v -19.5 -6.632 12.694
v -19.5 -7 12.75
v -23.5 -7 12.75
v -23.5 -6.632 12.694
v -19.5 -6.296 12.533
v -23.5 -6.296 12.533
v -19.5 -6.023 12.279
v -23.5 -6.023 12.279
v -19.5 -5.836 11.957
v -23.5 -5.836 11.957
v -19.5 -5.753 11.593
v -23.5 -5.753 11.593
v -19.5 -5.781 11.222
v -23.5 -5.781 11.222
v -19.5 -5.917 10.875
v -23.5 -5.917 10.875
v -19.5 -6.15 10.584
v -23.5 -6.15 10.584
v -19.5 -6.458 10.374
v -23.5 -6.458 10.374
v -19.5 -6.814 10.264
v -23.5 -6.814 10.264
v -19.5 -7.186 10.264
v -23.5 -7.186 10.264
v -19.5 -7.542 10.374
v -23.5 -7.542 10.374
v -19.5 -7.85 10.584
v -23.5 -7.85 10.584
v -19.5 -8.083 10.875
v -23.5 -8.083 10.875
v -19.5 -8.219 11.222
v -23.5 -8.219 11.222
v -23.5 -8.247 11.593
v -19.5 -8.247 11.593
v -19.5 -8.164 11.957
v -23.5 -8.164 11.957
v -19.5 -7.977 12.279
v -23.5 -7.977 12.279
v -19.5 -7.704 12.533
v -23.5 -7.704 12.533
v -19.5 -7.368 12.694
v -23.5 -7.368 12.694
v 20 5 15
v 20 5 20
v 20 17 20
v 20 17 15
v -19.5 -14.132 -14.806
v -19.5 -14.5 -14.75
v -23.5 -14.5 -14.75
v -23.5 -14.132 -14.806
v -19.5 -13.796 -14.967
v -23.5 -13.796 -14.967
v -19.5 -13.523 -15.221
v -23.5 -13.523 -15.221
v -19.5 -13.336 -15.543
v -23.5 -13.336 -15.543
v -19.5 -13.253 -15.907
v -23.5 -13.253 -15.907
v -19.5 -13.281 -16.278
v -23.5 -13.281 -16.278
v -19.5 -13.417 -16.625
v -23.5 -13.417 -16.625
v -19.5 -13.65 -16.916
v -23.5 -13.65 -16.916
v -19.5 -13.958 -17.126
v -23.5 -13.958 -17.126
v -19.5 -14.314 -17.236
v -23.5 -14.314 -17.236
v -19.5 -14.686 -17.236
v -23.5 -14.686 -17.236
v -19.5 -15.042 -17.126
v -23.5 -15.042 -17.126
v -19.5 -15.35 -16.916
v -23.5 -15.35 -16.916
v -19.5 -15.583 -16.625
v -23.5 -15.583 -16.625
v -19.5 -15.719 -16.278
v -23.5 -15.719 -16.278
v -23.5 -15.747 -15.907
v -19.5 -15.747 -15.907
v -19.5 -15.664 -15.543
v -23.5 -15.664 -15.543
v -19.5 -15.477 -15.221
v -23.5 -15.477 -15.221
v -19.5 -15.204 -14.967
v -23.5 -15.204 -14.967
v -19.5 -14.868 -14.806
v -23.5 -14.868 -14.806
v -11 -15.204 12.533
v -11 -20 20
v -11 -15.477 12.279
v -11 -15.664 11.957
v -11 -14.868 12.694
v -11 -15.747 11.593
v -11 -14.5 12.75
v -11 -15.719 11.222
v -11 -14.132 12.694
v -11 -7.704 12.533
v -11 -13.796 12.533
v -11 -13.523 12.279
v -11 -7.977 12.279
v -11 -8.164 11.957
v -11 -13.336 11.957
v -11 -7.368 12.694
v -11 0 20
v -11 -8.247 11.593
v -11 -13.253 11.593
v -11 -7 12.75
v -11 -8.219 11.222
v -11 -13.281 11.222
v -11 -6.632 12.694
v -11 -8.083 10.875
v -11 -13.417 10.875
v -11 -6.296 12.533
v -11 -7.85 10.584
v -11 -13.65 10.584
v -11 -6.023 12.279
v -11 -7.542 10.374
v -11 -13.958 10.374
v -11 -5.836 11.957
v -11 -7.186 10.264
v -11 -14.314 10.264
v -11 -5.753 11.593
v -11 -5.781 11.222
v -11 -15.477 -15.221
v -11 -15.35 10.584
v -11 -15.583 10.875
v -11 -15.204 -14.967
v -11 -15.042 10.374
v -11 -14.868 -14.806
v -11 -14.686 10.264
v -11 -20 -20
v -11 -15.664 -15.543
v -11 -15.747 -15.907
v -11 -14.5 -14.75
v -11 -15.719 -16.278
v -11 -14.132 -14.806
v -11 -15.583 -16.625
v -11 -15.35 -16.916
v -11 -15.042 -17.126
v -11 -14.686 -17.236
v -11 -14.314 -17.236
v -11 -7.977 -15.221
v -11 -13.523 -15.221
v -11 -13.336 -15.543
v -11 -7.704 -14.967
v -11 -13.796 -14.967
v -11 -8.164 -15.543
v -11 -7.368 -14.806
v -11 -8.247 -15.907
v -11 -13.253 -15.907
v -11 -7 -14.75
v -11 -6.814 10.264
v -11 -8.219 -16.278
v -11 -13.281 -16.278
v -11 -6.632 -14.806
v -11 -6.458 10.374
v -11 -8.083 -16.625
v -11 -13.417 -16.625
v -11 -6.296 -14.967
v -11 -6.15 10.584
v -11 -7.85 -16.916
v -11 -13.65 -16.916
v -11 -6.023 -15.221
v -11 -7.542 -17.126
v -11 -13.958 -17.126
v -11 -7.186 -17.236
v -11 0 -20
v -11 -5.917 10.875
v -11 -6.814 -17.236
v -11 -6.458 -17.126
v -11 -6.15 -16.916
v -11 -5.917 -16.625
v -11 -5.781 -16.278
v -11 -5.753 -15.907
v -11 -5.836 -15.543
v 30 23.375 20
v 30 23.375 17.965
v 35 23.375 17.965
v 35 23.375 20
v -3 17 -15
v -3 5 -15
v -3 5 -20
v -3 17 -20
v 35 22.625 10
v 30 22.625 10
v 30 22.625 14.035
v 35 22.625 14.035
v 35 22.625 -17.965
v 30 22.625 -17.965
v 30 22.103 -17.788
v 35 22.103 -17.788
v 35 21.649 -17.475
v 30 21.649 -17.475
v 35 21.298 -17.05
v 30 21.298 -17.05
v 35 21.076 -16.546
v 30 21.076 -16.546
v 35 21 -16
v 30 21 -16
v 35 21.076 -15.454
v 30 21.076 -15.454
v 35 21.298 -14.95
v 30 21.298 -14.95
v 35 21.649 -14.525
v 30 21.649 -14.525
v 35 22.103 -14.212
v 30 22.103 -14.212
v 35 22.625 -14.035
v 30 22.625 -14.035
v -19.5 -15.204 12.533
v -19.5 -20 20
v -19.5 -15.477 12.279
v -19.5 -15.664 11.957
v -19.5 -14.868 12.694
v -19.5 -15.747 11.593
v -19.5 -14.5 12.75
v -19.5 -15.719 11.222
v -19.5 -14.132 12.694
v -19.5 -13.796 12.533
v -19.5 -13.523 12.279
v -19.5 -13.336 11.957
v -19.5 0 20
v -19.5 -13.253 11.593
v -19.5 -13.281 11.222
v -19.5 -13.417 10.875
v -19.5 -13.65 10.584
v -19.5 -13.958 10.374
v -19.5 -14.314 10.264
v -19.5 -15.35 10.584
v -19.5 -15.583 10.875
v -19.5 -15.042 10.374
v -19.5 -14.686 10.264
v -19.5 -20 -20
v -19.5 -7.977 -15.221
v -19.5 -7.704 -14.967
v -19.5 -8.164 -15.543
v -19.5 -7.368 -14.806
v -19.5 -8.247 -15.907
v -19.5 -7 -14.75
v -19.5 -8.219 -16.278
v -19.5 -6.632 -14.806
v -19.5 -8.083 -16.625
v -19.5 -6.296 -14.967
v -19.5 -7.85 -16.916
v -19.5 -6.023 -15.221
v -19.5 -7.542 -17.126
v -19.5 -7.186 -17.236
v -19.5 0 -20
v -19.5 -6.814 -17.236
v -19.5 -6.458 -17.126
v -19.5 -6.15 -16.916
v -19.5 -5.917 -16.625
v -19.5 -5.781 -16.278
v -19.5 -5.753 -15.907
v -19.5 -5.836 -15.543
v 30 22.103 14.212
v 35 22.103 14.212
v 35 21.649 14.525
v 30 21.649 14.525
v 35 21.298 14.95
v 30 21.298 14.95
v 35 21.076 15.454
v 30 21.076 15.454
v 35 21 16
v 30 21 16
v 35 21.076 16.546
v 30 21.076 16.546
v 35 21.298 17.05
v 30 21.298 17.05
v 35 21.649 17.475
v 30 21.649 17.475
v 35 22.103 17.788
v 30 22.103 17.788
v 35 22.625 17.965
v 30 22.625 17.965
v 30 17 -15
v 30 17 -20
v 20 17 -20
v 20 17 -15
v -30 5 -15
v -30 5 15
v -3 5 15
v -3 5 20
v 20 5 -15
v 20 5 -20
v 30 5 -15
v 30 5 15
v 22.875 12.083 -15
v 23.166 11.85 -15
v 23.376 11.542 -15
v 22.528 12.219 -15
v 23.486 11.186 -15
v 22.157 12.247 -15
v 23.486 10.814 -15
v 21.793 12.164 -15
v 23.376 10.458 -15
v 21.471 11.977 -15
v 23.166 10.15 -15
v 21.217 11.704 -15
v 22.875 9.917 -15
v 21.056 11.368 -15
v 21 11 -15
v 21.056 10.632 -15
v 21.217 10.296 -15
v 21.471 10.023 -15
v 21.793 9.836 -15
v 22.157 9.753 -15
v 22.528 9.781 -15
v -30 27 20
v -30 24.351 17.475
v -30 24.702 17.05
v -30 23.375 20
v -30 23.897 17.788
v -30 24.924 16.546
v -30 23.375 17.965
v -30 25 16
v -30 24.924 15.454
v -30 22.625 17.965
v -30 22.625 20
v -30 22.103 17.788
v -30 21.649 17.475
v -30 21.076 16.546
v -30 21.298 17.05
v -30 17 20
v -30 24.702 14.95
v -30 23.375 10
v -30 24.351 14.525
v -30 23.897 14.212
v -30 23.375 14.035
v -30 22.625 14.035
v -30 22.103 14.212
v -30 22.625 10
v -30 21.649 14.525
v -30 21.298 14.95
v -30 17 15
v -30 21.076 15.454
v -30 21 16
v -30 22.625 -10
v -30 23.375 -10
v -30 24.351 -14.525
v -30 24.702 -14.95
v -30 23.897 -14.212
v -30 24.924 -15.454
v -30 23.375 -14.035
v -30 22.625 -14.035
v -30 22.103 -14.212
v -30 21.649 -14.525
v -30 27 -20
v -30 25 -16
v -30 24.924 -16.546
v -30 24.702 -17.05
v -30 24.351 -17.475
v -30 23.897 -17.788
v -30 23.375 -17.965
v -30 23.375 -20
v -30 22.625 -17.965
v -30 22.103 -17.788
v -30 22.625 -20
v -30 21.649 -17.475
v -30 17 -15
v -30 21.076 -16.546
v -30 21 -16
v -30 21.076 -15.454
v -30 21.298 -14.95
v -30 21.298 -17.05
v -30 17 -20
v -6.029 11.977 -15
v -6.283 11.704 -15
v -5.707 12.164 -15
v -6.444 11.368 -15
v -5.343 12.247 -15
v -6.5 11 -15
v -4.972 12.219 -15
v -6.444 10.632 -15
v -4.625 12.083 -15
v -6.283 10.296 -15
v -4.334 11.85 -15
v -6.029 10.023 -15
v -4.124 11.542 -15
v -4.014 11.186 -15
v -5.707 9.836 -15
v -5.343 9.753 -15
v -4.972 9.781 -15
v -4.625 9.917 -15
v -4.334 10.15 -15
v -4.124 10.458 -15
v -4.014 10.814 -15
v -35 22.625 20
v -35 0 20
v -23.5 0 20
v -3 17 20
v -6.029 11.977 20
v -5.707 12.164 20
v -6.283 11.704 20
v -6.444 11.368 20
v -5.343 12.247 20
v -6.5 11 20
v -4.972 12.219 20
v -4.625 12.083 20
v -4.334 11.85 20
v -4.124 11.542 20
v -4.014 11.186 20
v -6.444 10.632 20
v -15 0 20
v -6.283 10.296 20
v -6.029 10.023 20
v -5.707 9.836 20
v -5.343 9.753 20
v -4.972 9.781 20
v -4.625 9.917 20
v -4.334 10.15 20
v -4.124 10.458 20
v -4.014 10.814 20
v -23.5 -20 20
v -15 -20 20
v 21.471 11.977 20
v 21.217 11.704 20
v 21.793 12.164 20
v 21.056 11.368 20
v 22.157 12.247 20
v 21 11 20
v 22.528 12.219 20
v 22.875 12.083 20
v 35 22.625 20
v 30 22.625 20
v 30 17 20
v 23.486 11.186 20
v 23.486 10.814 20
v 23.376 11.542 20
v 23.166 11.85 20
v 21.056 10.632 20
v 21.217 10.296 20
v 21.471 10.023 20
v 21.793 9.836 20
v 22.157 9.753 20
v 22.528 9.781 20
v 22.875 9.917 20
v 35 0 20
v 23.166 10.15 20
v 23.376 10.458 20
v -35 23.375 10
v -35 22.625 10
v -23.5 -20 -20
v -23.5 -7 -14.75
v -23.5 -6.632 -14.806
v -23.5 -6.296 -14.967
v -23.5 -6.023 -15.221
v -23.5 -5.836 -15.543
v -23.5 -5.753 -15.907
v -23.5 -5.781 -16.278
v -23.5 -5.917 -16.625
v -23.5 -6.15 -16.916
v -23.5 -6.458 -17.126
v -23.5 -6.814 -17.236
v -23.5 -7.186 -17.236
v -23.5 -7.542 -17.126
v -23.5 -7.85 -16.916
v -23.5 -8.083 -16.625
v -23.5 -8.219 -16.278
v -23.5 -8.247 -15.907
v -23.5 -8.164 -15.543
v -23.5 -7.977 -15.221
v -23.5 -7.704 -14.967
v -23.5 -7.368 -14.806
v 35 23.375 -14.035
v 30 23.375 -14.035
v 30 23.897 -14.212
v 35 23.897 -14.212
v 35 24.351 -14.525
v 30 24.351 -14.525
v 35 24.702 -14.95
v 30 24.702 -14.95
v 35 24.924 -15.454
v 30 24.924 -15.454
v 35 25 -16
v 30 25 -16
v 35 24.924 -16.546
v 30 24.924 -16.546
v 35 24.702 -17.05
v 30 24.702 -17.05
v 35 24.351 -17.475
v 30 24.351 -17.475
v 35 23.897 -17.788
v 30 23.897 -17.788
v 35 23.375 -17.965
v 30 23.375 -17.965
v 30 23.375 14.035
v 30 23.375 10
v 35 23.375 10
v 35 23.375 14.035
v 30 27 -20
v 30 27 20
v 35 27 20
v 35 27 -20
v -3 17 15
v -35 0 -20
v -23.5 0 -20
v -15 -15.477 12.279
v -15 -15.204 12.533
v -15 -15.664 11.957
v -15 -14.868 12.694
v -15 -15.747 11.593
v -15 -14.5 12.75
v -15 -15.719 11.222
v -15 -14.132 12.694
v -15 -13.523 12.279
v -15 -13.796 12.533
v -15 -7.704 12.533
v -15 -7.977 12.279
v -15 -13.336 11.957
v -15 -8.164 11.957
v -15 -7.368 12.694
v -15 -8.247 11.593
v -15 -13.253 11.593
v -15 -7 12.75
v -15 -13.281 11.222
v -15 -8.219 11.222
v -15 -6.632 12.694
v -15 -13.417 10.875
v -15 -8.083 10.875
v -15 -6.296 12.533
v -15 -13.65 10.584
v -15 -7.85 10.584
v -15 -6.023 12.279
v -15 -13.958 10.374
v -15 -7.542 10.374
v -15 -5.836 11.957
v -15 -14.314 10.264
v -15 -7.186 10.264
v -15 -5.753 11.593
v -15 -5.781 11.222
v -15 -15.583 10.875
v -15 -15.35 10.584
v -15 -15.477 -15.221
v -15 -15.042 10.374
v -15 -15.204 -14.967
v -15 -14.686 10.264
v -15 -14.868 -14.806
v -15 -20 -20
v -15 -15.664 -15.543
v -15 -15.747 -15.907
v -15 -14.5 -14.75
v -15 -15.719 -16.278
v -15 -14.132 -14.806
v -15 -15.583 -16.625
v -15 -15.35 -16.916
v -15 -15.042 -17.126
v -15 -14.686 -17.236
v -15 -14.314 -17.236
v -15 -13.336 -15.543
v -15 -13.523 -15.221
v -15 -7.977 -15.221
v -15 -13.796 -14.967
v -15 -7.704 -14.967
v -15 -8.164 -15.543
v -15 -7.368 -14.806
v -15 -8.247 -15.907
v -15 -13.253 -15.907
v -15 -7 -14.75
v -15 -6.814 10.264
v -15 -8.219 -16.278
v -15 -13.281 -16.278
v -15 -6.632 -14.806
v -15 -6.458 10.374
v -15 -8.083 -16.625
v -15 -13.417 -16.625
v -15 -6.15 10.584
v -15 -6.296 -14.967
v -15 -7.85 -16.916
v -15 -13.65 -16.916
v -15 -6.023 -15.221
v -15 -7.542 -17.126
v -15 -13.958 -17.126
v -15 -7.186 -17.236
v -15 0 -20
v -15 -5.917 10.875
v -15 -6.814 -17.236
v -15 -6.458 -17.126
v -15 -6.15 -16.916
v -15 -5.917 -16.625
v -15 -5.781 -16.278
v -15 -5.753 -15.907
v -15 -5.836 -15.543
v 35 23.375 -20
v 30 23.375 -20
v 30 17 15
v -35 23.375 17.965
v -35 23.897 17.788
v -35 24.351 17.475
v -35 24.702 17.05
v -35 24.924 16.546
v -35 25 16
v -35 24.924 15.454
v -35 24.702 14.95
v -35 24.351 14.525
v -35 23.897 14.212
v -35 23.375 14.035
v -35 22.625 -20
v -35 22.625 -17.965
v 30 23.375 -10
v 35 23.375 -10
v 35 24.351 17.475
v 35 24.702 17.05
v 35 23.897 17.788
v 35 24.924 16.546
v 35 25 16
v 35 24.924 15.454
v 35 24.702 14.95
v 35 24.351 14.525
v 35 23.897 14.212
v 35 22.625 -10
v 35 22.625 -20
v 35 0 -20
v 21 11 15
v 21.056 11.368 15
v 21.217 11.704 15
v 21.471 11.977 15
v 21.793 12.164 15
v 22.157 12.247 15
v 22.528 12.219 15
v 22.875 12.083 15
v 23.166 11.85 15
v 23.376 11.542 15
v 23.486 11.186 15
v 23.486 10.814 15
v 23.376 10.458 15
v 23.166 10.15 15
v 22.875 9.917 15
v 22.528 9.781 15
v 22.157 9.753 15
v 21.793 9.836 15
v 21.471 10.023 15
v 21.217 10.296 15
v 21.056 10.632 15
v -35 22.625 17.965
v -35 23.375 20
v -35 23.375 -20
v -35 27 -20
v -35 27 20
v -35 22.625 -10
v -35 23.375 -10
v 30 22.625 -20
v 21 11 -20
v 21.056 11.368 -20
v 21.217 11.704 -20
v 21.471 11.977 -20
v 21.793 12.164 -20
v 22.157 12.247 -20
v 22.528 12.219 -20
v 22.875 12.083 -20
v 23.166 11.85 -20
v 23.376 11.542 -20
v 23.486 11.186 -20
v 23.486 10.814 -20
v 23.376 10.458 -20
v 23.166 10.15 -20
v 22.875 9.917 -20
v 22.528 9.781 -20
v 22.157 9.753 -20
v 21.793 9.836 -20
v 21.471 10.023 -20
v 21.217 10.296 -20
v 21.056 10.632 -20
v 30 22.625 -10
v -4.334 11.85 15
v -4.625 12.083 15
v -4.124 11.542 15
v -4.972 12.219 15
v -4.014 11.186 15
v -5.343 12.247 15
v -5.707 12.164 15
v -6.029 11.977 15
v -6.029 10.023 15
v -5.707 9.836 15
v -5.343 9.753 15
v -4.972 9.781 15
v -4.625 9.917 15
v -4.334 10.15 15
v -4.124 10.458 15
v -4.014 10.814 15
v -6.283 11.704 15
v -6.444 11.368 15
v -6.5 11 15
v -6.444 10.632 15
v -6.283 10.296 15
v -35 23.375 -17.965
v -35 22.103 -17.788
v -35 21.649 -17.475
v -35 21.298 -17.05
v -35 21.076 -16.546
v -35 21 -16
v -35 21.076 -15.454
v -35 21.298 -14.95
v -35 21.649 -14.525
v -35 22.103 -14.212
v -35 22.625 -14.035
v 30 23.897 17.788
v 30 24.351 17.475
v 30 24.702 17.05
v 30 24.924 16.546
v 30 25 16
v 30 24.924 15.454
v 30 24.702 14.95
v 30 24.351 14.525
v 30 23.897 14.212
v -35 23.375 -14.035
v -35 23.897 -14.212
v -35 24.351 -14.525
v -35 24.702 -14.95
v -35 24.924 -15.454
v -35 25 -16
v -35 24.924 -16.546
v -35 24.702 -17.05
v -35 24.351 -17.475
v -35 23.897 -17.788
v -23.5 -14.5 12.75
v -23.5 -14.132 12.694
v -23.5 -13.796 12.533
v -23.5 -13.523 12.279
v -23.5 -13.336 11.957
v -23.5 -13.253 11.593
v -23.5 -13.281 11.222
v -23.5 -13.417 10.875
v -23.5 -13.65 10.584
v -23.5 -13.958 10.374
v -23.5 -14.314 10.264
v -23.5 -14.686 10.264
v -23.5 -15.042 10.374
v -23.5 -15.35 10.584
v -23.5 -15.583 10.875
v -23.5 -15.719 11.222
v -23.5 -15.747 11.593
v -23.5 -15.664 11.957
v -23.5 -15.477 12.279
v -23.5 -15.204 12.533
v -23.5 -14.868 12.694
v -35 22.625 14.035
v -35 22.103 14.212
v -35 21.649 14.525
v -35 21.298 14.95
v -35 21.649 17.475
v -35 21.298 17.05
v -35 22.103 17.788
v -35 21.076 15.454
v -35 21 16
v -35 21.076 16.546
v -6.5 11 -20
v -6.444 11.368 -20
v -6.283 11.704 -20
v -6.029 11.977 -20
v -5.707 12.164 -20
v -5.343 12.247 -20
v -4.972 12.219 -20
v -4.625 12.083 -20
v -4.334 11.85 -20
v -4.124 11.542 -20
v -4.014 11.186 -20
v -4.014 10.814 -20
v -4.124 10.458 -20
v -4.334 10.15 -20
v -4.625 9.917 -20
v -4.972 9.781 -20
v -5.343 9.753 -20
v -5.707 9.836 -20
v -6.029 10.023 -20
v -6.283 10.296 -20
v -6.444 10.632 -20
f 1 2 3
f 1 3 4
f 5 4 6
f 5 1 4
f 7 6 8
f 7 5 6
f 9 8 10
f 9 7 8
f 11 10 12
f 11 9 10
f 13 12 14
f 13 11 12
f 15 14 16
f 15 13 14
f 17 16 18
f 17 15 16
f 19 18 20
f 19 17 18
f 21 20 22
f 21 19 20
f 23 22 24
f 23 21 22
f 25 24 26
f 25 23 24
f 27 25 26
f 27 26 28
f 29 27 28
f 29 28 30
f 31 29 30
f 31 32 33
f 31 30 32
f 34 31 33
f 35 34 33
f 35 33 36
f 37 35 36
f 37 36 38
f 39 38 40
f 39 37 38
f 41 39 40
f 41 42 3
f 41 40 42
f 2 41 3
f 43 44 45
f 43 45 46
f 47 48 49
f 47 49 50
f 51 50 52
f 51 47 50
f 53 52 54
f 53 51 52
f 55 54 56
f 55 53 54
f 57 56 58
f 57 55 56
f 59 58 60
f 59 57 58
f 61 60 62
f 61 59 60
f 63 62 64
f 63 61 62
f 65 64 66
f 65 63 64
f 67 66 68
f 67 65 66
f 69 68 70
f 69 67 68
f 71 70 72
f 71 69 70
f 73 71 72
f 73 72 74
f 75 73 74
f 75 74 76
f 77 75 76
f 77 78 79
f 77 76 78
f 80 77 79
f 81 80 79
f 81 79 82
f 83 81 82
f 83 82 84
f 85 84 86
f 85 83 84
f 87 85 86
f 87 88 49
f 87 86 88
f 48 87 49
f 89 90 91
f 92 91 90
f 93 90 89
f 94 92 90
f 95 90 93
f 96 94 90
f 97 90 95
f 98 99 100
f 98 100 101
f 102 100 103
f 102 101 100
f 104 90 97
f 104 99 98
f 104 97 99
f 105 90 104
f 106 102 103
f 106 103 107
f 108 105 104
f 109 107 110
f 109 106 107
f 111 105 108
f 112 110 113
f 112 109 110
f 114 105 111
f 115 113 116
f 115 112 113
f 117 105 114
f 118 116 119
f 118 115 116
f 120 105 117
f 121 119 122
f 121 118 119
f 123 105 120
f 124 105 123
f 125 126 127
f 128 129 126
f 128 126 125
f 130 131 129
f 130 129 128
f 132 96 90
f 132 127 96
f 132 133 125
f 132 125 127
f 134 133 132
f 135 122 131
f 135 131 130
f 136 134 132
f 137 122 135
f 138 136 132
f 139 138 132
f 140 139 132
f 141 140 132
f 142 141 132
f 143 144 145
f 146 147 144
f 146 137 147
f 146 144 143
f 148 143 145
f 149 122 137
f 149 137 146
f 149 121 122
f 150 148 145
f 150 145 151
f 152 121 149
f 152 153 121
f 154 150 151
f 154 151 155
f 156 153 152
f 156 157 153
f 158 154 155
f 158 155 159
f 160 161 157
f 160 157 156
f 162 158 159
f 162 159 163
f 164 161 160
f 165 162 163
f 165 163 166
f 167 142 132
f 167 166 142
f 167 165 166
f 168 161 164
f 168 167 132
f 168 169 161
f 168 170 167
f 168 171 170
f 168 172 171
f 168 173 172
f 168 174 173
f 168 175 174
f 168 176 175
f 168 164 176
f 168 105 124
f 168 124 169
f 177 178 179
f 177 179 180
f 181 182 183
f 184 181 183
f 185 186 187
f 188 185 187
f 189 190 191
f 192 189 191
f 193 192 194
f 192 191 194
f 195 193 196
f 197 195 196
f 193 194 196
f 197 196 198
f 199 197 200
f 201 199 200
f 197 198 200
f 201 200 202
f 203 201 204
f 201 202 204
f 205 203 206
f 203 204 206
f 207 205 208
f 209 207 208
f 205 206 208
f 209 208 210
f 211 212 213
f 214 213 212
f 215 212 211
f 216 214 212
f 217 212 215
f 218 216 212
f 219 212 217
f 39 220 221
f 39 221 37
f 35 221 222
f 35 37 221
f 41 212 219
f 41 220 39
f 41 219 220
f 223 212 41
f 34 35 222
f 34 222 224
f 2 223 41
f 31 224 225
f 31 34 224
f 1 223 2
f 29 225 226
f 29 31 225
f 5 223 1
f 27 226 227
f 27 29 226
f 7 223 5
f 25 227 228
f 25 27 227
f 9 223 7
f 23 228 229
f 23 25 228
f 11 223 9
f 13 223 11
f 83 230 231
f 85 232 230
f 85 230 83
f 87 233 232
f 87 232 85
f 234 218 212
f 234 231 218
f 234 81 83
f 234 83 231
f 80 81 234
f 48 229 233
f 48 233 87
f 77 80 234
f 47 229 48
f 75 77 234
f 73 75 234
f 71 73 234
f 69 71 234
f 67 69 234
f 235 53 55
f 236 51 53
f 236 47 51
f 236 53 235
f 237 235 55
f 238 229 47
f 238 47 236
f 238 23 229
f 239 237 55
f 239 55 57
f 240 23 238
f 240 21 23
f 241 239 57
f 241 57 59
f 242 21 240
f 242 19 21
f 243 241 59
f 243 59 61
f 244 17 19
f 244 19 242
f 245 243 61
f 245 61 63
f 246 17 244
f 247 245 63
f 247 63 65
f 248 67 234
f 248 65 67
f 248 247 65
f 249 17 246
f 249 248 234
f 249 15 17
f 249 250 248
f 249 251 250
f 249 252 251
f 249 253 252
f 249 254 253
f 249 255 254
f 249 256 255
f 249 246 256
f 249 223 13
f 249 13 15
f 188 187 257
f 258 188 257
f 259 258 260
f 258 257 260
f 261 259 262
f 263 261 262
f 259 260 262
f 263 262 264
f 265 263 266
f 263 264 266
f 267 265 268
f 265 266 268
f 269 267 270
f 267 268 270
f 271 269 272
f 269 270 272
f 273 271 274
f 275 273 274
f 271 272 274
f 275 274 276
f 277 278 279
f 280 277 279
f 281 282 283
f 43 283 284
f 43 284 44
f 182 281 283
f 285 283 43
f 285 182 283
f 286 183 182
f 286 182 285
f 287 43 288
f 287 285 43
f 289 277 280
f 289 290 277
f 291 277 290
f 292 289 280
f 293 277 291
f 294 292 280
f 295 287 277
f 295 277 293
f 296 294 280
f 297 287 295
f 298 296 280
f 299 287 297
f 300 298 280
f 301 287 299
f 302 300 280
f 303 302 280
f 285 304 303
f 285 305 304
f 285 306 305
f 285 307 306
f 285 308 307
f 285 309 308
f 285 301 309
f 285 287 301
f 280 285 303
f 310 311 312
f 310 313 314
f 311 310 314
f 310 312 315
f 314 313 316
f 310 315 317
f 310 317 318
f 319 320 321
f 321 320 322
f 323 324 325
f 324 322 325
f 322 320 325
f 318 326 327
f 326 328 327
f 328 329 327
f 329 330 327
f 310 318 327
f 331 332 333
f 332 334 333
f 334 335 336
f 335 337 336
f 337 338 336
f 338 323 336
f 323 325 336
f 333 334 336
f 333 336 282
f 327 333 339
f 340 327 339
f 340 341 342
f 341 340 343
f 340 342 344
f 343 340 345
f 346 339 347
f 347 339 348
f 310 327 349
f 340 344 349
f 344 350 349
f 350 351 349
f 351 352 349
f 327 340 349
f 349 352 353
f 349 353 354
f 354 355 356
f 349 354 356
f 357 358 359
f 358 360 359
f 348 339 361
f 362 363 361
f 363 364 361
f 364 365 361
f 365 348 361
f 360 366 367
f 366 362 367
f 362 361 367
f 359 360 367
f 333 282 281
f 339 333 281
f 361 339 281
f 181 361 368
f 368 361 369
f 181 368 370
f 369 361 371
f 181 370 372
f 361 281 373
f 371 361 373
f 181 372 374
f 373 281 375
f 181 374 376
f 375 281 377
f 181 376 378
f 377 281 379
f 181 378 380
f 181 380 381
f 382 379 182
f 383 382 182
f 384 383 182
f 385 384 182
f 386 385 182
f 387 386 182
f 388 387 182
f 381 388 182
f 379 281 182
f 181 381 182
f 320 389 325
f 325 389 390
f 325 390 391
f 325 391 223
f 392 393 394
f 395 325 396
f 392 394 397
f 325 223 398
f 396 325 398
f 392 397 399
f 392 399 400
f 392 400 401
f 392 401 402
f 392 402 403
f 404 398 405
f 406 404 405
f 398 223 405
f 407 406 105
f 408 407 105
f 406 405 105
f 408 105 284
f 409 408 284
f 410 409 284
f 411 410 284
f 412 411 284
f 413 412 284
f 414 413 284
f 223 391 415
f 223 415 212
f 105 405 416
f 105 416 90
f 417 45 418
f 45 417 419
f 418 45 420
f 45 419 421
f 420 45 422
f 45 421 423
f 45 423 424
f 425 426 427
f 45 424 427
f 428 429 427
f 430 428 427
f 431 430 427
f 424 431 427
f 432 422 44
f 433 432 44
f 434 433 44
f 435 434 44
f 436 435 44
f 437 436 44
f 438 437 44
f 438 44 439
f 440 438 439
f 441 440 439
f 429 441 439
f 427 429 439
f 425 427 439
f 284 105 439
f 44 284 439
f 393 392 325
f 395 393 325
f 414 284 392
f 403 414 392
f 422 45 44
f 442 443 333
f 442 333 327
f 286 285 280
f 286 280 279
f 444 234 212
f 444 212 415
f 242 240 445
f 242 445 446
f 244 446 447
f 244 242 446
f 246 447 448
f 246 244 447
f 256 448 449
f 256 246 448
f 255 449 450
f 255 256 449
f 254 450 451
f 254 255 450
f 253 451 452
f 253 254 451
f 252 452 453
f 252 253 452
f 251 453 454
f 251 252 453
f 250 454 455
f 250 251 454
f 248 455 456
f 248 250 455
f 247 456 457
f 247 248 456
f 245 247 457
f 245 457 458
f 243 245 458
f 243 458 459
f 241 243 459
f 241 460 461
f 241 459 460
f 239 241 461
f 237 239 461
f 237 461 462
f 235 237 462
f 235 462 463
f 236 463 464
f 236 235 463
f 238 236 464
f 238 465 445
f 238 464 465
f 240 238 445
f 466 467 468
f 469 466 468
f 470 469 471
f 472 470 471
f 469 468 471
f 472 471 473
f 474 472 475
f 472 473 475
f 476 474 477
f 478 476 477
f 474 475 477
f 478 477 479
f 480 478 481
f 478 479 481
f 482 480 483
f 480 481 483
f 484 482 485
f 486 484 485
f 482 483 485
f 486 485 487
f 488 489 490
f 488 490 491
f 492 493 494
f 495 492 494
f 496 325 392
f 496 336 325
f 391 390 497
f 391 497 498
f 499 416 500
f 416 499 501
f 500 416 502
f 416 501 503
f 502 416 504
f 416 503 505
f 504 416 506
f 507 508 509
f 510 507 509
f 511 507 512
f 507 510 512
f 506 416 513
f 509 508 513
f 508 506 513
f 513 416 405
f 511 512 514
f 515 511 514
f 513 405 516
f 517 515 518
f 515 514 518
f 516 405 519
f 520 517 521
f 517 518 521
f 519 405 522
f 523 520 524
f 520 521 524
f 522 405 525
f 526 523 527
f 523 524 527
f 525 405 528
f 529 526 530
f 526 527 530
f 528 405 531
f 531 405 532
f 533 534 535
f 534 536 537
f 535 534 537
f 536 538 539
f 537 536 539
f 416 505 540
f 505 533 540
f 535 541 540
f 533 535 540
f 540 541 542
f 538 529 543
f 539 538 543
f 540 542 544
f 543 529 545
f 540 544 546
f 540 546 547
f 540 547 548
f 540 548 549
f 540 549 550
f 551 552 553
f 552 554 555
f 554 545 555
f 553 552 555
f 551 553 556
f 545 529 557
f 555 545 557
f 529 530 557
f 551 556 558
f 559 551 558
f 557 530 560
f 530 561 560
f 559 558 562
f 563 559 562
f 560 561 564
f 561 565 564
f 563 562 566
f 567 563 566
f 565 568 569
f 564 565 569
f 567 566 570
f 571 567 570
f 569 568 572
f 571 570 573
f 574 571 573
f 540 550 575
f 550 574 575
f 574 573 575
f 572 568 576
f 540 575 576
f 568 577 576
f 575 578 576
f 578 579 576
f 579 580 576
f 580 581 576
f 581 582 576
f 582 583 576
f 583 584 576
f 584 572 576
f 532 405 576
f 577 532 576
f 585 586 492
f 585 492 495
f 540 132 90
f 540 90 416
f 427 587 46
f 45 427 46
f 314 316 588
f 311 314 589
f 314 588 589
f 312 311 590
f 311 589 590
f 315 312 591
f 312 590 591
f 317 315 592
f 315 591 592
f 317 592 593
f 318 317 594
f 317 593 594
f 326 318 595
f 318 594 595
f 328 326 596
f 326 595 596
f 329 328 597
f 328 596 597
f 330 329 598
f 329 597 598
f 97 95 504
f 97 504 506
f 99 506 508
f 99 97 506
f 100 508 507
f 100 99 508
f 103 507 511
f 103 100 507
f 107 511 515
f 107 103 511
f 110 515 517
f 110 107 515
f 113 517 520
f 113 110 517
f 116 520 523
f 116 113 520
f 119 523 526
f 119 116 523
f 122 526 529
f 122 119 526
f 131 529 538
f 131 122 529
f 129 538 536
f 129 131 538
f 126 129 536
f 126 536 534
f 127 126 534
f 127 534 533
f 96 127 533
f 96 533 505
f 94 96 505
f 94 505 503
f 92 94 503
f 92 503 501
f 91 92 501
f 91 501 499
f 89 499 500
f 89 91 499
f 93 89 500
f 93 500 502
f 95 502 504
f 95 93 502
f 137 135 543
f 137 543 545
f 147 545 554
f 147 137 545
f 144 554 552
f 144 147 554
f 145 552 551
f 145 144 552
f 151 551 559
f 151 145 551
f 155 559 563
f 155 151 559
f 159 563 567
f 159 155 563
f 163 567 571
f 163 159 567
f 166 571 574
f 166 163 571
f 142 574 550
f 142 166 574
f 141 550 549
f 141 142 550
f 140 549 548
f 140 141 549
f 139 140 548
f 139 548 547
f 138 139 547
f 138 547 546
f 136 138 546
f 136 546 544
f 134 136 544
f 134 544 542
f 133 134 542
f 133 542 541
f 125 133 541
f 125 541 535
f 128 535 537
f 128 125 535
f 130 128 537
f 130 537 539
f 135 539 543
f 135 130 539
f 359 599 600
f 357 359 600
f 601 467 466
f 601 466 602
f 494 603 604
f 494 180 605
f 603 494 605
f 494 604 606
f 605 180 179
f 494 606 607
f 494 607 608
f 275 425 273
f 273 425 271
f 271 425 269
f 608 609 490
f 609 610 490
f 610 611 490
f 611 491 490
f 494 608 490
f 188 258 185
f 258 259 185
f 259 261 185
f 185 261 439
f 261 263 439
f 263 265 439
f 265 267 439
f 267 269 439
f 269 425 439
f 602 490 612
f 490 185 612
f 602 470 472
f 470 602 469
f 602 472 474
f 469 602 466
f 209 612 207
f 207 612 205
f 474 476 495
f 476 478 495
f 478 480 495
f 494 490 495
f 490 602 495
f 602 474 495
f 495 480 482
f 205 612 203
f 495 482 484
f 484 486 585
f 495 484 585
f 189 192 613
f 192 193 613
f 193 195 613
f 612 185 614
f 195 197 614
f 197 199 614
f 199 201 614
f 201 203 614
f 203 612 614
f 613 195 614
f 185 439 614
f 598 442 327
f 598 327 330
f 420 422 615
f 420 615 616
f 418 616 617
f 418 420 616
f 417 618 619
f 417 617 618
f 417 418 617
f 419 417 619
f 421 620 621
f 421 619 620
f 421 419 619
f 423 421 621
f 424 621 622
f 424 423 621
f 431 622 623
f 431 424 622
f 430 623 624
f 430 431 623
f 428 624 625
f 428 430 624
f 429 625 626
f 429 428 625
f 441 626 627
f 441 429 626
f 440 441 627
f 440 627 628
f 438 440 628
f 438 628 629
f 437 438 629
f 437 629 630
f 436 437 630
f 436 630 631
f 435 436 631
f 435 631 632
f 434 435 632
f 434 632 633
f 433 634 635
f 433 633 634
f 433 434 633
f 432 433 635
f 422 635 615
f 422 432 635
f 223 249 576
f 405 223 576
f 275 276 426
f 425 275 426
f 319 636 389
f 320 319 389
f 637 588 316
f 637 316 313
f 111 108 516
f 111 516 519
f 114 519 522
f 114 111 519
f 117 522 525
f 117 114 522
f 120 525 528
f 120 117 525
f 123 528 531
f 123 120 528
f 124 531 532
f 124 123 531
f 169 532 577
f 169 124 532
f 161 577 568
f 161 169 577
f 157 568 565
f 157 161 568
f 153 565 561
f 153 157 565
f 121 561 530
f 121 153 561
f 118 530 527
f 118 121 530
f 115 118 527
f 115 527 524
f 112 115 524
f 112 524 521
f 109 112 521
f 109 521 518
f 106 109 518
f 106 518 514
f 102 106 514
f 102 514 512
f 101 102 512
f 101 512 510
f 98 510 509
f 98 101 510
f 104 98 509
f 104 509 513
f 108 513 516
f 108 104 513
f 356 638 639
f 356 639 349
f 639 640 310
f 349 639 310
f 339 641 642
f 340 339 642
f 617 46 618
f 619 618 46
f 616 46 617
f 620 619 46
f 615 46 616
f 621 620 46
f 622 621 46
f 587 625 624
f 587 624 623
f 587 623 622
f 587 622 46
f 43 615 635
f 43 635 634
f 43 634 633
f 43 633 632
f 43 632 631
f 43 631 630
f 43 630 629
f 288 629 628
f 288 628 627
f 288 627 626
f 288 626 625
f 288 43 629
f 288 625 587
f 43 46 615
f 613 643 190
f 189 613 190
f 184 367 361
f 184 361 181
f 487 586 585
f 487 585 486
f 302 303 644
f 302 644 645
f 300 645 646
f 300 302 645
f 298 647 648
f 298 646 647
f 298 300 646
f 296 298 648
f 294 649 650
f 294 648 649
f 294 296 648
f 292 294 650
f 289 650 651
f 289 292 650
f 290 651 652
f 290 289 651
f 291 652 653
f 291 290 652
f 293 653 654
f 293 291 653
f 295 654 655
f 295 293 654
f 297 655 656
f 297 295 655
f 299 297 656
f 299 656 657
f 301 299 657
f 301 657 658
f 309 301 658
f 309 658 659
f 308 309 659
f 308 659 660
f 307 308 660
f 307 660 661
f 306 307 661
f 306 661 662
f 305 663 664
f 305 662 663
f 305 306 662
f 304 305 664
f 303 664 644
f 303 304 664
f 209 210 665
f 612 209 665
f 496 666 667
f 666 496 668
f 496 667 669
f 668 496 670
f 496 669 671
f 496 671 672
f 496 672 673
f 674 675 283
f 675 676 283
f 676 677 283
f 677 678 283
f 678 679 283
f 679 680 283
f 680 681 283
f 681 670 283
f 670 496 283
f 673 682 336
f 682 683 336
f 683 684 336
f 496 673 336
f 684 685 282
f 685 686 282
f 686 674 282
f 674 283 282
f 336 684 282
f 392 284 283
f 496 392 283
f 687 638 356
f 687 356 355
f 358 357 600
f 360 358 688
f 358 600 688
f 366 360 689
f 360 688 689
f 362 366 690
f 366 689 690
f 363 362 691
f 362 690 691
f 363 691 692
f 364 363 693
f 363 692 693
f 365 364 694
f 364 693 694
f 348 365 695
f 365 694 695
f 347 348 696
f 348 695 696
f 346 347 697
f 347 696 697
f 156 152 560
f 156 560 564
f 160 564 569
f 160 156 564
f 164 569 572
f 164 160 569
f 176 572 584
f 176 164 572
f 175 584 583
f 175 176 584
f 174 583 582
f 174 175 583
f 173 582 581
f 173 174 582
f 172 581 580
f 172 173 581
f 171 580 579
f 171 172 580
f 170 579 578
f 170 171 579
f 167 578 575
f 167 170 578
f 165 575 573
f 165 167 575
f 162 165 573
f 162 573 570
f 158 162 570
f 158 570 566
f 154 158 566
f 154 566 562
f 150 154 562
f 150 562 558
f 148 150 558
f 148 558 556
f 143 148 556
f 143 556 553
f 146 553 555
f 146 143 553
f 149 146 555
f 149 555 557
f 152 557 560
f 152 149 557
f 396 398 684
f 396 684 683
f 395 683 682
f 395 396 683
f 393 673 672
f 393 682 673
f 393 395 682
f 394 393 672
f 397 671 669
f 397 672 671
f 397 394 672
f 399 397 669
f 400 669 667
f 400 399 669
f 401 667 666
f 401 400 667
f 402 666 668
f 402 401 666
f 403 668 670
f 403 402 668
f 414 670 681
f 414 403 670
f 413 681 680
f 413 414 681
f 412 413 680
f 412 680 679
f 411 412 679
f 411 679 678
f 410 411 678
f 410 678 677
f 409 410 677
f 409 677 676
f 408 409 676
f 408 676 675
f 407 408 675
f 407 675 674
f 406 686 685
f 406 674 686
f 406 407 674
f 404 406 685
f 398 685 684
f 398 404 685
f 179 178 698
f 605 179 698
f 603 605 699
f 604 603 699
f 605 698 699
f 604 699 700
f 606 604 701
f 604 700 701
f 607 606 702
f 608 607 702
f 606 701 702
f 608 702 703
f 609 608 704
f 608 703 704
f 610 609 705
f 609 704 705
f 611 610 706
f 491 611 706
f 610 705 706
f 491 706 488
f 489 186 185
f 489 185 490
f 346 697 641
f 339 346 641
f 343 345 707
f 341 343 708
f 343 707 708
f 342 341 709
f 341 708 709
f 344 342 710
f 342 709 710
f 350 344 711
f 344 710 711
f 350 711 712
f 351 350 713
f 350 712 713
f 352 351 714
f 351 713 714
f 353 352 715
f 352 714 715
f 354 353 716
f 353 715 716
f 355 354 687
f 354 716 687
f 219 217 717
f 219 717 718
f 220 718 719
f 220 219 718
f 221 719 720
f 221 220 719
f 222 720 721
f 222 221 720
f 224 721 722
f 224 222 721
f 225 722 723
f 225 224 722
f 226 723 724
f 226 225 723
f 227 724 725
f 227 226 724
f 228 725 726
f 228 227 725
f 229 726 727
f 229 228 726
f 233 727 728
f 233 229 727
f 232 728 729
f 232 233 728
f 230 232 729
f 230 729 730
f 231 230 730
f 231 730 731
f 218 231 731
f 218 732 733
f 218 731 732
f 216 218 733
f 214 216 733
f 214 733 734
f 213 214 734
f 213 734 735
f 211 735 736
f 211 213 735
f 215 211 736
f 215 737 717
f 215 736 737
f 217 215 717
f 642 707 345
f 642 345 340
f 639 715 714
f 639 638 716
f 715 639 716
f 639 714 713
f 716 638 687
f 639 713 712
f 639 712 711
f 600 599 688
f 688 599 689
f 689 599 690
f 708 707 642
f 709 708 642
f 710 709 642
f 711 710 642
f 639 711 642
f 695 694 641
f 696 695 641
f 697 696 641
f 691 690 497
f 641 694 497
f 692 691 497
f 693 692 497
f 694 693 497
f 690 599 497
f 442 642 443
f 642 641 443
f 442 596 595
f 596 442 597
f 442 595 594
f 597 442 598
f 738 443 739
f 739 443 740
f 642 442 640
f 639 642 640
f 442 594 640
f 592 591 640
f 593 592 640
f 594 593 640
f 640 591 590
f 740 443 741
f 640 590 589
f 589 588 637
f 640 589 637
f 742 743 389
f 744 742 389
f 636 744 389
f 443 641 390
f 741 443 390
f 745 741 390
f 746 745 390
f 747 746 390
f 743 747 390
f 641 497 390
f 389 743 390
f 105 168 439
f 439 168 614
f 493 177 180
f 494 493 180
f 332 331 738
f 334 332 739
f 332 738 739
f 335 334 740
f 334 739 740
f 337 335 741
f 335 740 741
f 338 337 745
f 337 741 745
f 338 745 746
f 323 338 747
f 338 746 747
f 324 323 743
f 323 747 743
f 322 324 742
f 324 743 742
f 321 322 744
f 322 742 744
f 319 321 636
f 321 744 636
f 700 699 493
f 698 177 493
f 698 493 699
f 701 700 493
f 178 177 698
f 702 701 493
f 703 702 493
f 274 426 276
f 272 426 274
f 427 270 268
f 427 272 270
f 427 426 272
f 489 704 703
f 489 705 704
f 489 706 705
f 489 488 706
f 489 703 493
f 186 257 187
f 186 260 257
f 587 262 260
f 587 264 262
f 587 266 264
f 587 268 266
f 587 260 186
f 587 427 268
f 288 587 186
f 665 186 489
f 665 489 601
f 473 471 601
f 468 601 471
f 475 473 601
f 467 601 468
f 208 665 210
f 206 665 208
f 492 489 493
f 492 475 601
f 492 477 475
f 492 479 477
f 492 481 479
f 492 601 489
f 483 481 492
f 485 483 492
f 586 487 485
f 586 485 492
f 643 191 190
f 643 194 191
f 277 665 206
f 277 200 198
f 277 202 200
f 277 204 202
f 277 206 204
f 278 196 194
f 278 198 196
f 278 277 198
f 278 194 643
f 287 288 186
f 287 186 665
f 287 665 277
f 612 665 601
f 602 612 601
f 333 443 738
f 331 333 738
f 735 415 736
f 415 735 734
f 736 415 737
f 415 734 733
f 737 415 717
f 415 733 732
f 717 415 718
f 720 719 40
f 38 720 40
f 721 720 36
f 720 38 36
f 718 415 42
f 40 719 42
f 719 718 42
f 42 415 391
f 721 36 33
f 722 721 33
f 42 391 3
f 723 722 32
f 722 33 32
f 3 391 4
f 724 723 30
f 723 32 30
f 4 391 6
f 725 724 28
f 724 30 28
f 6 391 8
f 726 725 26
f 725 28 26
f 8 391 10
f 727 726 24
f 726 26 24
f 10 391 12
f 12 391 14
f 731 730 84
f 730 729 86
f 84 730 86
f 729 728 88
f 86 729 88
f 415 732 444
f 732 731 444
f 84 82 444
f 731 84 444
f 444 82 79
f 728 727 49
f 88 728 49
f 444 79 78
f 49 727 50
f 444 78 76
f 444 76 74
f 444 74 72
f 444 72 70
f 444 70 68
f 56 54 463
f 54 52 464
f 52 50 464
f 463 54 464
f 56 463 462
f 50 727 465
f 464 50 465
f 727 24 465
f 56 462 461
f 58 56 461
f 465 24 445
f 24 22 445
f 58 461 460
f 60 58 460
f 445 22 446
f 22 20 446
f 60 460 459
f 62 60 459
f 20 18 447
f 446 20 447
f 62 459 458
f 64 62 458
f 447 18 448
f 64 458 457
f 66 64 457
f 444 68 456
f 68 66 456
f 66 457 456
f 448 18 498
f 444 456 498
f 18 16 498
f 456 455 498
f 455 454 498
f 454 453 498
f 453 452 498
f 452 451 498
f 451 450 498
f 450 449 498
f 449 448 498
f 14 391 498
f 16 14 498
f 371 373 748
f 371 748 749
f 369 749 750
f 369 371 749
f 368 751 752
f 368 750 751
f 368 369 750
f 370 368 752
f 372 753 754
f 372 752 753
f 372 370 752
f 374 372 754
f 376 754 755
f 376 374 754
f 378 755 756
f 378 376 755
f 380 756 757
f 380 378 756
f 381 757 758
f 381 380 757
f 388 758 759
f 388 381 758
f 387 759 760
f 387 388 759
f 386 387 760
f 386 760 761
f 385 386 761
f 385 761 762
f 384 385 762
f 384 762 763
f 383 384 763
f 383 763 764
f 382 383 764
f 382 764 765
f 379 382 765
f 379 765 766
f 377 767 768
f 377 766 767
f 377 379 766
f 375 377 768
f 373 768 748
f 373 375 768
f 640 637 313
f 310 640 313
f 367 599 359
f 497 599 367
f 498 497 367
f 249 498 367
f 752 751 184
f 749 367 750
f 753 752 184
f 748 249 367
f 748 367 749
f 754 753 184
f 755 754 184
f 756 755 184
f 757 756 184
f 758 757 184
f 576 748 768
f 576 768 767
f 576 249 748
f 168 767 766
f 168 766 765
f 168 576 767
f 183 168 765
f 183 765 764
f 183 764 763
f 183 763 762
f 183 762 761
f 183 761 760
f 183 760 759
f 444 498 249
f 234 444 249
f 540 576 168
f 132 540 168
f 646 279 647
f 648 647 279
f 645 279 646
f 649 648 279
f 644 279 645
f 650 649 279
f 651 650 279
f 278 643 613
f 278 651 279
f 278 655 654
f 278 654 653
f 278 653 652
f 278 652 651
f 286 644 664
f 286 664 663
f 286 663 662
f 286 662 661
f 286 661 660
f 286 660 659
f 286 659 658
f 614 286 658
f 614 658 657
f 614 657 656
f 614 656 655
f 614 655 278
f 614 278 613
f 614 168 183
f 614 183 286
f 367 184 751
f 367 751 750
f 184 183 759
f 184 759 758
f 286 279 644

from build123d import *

# Parameters (mm, degrees)
SKETCH1_W               = 70
SKETCH1_H               = 40
BOSS_EXTRUDE1_DEPTH     = 5
BOSS_EXTRUDE2_DEPTH     = 12
SKETCH3_W               = 5
SKETCH3_H               = 40
BOSS_EXTRUDE3_DEPTH     = 10
SKETCH5_R               = 2
CUT_EXTRUDE1_DEPTH      = 78.646635471
CUT_EXTRUDE3_DEPTH      = 57.382621436
CUT_EXTRUDE3_DEPTH_BACK = 57.382621436
SKETCH7_R               = 1.25
SKETCH8_W               = 10
SKETCH8_H               = 0.75
CUT_EXTRUDE4_DEPTH      = 78.646635471
SKETCH9_W               = 4
SKETCH9_H               = 40
BOSS_EXTRUDE4_DEPTH     = 20
CUT_EXTRUDE5_DEPTH      = 50.727549083
CUT_EXTRUDE5_DEPTH_BACK = 50.727549083
SKETCH11_R              = 1.25


with BuildPart() as part:
    # Sketch1 → Boss-Extrude1 (new body)
    with BuildSketch(Plane(origin=(0, 0, 0), x_dir=(1, 0, 0), z_dir=(0, 1, 0))):
        Rectangle(SKETCH1_W, SKETCH1_H)
    extrude(amount=BOSS_EXTRUDE1_DEPTH)

    # Sketch2 → Boss-Extrude2 (add)
    with BuildSketch(Plane(origin=(0, 5, 0), x_dir=(1, 0, 0), z_dir=(0, 1, 0))):
        Polygon((-3, -20), (-3, -15), (-30, -15), (-30, 15), (-3, 15), (-3, 20), (-35, 20), (-35, -20), align=None)
        Polygon((20, -15), (30, -15), (30, 15), (20, 15), (20, 20), (35, 20), (35, -20), (20, -20), align=None)
    extrude(amount=BOSS_EXTRUDE2_DEPTH)

    # Sketch3 → Boss-Extrude3 (add)
    with BuildSketch(Plane(origin=(0, 17, 0), x_dir=(1, 0, 0), z_dir=(0, 1, 0))):
        with Locations((32.5, 0)):
            Rectangle(SKETCH3_W, SKETCH3_H)
        with Locations((-32.5, 0)):
            Rectangle(SKETCH3_W, SKETCH3_H)
    extrude(amount=BOSS_EXTRUDE3_DEPTH)

    # Sketch5 → Cut-Extrude1 (cut, through all)
    with BuildSketch(Plane.ZY.offset(35)):
        with Locations((16, 23)):
            Circle(SKETCH5_R)
        with Locations(Location((-16, 23, 0), (0, 0, 180))):
            Circle(SKETCH5_R)
    extrude(amount=-CUT_EXTRUDE1_DEPTH, mode=Mode.SUBTRACT)

    # Sketch7 → Cut-Extrude3 (cut, two sides: drawn at the far end of the back side and taken through both)
    with BuildSketch(Plane(origin=(0, 0, 15), x_dir=(-1, 0, 0), z_dir=(0, 0, -1)).offset(-CUT_EXTRUDE3_DEPTH_BACK)):
        with Locations((-22.25, 11)):
            Circle(SKETCH7_R)
        with Locations((5.25, 11)):
            Circle(SKETCH7_R)
    extrude(amount=CUT_EXTRUDE3_DEPTH + CUT_EXTRUDE3_DEPTH_BACK, mode=Mode.SUBTRACT)

    # Sketch8 → Cut-Extrude4 (cut, through all)
    with BuildSketch(Plane.ZY.offset(35)):
        with Locations((15, 23)):
            Rectangle(SKETCH8_W, SKETCH8_H)
        with Locations((-15, 23)):
            Rectangle(SKETCH8_W, SKETCH8_H)
    extrude(amount=-CUT_EXTRUDE4_DEPTH, mode=Mode.SUBTRACT)

    # Sketch9 → Boss-Extrude4 (add)
    with BuildSketch(Plane(origin=(0, 0, 0), x_dir=(-1, 0, 0), z_dir=(0, -1, 0))):
        with Locations((21.5, 0)):
            Rectangle(SKETCH9_W, SKETCH9_H)
        with Locations((13, 0)):
            Rectangle(SKETCH9_W, SKETCH9_H)
    extrude(amount=BOSS_EXTRUDE4_DEPTH)

    # Sketch11 → Cut-Extrude5 (cut, two sides: drawn at the far end of the back side and taken through both)
    with BuildSketch(Plane.ZY.offset(1.658275161).offset(-CUT_EXTRUDE5_DEPTH_BACK)):
        with Locations((11.5, -14.5)):
            Circle(SKETCH11_R)
        with Locations((-16, -14.5)):
            Circle(SKETCH11_R)
        with Locations((-16, -7)):
            Circle(SKETCH11_R)
        with Locations((11.5, -7)):
            Circle(SKETCH11_R)
    extrude(amount=CUT_EXTRUDE5_DEPTH + CUT_EXTRUDE5_DEPTH_BACK, mode=Mode.SUBTRACT)


solid = part.part
